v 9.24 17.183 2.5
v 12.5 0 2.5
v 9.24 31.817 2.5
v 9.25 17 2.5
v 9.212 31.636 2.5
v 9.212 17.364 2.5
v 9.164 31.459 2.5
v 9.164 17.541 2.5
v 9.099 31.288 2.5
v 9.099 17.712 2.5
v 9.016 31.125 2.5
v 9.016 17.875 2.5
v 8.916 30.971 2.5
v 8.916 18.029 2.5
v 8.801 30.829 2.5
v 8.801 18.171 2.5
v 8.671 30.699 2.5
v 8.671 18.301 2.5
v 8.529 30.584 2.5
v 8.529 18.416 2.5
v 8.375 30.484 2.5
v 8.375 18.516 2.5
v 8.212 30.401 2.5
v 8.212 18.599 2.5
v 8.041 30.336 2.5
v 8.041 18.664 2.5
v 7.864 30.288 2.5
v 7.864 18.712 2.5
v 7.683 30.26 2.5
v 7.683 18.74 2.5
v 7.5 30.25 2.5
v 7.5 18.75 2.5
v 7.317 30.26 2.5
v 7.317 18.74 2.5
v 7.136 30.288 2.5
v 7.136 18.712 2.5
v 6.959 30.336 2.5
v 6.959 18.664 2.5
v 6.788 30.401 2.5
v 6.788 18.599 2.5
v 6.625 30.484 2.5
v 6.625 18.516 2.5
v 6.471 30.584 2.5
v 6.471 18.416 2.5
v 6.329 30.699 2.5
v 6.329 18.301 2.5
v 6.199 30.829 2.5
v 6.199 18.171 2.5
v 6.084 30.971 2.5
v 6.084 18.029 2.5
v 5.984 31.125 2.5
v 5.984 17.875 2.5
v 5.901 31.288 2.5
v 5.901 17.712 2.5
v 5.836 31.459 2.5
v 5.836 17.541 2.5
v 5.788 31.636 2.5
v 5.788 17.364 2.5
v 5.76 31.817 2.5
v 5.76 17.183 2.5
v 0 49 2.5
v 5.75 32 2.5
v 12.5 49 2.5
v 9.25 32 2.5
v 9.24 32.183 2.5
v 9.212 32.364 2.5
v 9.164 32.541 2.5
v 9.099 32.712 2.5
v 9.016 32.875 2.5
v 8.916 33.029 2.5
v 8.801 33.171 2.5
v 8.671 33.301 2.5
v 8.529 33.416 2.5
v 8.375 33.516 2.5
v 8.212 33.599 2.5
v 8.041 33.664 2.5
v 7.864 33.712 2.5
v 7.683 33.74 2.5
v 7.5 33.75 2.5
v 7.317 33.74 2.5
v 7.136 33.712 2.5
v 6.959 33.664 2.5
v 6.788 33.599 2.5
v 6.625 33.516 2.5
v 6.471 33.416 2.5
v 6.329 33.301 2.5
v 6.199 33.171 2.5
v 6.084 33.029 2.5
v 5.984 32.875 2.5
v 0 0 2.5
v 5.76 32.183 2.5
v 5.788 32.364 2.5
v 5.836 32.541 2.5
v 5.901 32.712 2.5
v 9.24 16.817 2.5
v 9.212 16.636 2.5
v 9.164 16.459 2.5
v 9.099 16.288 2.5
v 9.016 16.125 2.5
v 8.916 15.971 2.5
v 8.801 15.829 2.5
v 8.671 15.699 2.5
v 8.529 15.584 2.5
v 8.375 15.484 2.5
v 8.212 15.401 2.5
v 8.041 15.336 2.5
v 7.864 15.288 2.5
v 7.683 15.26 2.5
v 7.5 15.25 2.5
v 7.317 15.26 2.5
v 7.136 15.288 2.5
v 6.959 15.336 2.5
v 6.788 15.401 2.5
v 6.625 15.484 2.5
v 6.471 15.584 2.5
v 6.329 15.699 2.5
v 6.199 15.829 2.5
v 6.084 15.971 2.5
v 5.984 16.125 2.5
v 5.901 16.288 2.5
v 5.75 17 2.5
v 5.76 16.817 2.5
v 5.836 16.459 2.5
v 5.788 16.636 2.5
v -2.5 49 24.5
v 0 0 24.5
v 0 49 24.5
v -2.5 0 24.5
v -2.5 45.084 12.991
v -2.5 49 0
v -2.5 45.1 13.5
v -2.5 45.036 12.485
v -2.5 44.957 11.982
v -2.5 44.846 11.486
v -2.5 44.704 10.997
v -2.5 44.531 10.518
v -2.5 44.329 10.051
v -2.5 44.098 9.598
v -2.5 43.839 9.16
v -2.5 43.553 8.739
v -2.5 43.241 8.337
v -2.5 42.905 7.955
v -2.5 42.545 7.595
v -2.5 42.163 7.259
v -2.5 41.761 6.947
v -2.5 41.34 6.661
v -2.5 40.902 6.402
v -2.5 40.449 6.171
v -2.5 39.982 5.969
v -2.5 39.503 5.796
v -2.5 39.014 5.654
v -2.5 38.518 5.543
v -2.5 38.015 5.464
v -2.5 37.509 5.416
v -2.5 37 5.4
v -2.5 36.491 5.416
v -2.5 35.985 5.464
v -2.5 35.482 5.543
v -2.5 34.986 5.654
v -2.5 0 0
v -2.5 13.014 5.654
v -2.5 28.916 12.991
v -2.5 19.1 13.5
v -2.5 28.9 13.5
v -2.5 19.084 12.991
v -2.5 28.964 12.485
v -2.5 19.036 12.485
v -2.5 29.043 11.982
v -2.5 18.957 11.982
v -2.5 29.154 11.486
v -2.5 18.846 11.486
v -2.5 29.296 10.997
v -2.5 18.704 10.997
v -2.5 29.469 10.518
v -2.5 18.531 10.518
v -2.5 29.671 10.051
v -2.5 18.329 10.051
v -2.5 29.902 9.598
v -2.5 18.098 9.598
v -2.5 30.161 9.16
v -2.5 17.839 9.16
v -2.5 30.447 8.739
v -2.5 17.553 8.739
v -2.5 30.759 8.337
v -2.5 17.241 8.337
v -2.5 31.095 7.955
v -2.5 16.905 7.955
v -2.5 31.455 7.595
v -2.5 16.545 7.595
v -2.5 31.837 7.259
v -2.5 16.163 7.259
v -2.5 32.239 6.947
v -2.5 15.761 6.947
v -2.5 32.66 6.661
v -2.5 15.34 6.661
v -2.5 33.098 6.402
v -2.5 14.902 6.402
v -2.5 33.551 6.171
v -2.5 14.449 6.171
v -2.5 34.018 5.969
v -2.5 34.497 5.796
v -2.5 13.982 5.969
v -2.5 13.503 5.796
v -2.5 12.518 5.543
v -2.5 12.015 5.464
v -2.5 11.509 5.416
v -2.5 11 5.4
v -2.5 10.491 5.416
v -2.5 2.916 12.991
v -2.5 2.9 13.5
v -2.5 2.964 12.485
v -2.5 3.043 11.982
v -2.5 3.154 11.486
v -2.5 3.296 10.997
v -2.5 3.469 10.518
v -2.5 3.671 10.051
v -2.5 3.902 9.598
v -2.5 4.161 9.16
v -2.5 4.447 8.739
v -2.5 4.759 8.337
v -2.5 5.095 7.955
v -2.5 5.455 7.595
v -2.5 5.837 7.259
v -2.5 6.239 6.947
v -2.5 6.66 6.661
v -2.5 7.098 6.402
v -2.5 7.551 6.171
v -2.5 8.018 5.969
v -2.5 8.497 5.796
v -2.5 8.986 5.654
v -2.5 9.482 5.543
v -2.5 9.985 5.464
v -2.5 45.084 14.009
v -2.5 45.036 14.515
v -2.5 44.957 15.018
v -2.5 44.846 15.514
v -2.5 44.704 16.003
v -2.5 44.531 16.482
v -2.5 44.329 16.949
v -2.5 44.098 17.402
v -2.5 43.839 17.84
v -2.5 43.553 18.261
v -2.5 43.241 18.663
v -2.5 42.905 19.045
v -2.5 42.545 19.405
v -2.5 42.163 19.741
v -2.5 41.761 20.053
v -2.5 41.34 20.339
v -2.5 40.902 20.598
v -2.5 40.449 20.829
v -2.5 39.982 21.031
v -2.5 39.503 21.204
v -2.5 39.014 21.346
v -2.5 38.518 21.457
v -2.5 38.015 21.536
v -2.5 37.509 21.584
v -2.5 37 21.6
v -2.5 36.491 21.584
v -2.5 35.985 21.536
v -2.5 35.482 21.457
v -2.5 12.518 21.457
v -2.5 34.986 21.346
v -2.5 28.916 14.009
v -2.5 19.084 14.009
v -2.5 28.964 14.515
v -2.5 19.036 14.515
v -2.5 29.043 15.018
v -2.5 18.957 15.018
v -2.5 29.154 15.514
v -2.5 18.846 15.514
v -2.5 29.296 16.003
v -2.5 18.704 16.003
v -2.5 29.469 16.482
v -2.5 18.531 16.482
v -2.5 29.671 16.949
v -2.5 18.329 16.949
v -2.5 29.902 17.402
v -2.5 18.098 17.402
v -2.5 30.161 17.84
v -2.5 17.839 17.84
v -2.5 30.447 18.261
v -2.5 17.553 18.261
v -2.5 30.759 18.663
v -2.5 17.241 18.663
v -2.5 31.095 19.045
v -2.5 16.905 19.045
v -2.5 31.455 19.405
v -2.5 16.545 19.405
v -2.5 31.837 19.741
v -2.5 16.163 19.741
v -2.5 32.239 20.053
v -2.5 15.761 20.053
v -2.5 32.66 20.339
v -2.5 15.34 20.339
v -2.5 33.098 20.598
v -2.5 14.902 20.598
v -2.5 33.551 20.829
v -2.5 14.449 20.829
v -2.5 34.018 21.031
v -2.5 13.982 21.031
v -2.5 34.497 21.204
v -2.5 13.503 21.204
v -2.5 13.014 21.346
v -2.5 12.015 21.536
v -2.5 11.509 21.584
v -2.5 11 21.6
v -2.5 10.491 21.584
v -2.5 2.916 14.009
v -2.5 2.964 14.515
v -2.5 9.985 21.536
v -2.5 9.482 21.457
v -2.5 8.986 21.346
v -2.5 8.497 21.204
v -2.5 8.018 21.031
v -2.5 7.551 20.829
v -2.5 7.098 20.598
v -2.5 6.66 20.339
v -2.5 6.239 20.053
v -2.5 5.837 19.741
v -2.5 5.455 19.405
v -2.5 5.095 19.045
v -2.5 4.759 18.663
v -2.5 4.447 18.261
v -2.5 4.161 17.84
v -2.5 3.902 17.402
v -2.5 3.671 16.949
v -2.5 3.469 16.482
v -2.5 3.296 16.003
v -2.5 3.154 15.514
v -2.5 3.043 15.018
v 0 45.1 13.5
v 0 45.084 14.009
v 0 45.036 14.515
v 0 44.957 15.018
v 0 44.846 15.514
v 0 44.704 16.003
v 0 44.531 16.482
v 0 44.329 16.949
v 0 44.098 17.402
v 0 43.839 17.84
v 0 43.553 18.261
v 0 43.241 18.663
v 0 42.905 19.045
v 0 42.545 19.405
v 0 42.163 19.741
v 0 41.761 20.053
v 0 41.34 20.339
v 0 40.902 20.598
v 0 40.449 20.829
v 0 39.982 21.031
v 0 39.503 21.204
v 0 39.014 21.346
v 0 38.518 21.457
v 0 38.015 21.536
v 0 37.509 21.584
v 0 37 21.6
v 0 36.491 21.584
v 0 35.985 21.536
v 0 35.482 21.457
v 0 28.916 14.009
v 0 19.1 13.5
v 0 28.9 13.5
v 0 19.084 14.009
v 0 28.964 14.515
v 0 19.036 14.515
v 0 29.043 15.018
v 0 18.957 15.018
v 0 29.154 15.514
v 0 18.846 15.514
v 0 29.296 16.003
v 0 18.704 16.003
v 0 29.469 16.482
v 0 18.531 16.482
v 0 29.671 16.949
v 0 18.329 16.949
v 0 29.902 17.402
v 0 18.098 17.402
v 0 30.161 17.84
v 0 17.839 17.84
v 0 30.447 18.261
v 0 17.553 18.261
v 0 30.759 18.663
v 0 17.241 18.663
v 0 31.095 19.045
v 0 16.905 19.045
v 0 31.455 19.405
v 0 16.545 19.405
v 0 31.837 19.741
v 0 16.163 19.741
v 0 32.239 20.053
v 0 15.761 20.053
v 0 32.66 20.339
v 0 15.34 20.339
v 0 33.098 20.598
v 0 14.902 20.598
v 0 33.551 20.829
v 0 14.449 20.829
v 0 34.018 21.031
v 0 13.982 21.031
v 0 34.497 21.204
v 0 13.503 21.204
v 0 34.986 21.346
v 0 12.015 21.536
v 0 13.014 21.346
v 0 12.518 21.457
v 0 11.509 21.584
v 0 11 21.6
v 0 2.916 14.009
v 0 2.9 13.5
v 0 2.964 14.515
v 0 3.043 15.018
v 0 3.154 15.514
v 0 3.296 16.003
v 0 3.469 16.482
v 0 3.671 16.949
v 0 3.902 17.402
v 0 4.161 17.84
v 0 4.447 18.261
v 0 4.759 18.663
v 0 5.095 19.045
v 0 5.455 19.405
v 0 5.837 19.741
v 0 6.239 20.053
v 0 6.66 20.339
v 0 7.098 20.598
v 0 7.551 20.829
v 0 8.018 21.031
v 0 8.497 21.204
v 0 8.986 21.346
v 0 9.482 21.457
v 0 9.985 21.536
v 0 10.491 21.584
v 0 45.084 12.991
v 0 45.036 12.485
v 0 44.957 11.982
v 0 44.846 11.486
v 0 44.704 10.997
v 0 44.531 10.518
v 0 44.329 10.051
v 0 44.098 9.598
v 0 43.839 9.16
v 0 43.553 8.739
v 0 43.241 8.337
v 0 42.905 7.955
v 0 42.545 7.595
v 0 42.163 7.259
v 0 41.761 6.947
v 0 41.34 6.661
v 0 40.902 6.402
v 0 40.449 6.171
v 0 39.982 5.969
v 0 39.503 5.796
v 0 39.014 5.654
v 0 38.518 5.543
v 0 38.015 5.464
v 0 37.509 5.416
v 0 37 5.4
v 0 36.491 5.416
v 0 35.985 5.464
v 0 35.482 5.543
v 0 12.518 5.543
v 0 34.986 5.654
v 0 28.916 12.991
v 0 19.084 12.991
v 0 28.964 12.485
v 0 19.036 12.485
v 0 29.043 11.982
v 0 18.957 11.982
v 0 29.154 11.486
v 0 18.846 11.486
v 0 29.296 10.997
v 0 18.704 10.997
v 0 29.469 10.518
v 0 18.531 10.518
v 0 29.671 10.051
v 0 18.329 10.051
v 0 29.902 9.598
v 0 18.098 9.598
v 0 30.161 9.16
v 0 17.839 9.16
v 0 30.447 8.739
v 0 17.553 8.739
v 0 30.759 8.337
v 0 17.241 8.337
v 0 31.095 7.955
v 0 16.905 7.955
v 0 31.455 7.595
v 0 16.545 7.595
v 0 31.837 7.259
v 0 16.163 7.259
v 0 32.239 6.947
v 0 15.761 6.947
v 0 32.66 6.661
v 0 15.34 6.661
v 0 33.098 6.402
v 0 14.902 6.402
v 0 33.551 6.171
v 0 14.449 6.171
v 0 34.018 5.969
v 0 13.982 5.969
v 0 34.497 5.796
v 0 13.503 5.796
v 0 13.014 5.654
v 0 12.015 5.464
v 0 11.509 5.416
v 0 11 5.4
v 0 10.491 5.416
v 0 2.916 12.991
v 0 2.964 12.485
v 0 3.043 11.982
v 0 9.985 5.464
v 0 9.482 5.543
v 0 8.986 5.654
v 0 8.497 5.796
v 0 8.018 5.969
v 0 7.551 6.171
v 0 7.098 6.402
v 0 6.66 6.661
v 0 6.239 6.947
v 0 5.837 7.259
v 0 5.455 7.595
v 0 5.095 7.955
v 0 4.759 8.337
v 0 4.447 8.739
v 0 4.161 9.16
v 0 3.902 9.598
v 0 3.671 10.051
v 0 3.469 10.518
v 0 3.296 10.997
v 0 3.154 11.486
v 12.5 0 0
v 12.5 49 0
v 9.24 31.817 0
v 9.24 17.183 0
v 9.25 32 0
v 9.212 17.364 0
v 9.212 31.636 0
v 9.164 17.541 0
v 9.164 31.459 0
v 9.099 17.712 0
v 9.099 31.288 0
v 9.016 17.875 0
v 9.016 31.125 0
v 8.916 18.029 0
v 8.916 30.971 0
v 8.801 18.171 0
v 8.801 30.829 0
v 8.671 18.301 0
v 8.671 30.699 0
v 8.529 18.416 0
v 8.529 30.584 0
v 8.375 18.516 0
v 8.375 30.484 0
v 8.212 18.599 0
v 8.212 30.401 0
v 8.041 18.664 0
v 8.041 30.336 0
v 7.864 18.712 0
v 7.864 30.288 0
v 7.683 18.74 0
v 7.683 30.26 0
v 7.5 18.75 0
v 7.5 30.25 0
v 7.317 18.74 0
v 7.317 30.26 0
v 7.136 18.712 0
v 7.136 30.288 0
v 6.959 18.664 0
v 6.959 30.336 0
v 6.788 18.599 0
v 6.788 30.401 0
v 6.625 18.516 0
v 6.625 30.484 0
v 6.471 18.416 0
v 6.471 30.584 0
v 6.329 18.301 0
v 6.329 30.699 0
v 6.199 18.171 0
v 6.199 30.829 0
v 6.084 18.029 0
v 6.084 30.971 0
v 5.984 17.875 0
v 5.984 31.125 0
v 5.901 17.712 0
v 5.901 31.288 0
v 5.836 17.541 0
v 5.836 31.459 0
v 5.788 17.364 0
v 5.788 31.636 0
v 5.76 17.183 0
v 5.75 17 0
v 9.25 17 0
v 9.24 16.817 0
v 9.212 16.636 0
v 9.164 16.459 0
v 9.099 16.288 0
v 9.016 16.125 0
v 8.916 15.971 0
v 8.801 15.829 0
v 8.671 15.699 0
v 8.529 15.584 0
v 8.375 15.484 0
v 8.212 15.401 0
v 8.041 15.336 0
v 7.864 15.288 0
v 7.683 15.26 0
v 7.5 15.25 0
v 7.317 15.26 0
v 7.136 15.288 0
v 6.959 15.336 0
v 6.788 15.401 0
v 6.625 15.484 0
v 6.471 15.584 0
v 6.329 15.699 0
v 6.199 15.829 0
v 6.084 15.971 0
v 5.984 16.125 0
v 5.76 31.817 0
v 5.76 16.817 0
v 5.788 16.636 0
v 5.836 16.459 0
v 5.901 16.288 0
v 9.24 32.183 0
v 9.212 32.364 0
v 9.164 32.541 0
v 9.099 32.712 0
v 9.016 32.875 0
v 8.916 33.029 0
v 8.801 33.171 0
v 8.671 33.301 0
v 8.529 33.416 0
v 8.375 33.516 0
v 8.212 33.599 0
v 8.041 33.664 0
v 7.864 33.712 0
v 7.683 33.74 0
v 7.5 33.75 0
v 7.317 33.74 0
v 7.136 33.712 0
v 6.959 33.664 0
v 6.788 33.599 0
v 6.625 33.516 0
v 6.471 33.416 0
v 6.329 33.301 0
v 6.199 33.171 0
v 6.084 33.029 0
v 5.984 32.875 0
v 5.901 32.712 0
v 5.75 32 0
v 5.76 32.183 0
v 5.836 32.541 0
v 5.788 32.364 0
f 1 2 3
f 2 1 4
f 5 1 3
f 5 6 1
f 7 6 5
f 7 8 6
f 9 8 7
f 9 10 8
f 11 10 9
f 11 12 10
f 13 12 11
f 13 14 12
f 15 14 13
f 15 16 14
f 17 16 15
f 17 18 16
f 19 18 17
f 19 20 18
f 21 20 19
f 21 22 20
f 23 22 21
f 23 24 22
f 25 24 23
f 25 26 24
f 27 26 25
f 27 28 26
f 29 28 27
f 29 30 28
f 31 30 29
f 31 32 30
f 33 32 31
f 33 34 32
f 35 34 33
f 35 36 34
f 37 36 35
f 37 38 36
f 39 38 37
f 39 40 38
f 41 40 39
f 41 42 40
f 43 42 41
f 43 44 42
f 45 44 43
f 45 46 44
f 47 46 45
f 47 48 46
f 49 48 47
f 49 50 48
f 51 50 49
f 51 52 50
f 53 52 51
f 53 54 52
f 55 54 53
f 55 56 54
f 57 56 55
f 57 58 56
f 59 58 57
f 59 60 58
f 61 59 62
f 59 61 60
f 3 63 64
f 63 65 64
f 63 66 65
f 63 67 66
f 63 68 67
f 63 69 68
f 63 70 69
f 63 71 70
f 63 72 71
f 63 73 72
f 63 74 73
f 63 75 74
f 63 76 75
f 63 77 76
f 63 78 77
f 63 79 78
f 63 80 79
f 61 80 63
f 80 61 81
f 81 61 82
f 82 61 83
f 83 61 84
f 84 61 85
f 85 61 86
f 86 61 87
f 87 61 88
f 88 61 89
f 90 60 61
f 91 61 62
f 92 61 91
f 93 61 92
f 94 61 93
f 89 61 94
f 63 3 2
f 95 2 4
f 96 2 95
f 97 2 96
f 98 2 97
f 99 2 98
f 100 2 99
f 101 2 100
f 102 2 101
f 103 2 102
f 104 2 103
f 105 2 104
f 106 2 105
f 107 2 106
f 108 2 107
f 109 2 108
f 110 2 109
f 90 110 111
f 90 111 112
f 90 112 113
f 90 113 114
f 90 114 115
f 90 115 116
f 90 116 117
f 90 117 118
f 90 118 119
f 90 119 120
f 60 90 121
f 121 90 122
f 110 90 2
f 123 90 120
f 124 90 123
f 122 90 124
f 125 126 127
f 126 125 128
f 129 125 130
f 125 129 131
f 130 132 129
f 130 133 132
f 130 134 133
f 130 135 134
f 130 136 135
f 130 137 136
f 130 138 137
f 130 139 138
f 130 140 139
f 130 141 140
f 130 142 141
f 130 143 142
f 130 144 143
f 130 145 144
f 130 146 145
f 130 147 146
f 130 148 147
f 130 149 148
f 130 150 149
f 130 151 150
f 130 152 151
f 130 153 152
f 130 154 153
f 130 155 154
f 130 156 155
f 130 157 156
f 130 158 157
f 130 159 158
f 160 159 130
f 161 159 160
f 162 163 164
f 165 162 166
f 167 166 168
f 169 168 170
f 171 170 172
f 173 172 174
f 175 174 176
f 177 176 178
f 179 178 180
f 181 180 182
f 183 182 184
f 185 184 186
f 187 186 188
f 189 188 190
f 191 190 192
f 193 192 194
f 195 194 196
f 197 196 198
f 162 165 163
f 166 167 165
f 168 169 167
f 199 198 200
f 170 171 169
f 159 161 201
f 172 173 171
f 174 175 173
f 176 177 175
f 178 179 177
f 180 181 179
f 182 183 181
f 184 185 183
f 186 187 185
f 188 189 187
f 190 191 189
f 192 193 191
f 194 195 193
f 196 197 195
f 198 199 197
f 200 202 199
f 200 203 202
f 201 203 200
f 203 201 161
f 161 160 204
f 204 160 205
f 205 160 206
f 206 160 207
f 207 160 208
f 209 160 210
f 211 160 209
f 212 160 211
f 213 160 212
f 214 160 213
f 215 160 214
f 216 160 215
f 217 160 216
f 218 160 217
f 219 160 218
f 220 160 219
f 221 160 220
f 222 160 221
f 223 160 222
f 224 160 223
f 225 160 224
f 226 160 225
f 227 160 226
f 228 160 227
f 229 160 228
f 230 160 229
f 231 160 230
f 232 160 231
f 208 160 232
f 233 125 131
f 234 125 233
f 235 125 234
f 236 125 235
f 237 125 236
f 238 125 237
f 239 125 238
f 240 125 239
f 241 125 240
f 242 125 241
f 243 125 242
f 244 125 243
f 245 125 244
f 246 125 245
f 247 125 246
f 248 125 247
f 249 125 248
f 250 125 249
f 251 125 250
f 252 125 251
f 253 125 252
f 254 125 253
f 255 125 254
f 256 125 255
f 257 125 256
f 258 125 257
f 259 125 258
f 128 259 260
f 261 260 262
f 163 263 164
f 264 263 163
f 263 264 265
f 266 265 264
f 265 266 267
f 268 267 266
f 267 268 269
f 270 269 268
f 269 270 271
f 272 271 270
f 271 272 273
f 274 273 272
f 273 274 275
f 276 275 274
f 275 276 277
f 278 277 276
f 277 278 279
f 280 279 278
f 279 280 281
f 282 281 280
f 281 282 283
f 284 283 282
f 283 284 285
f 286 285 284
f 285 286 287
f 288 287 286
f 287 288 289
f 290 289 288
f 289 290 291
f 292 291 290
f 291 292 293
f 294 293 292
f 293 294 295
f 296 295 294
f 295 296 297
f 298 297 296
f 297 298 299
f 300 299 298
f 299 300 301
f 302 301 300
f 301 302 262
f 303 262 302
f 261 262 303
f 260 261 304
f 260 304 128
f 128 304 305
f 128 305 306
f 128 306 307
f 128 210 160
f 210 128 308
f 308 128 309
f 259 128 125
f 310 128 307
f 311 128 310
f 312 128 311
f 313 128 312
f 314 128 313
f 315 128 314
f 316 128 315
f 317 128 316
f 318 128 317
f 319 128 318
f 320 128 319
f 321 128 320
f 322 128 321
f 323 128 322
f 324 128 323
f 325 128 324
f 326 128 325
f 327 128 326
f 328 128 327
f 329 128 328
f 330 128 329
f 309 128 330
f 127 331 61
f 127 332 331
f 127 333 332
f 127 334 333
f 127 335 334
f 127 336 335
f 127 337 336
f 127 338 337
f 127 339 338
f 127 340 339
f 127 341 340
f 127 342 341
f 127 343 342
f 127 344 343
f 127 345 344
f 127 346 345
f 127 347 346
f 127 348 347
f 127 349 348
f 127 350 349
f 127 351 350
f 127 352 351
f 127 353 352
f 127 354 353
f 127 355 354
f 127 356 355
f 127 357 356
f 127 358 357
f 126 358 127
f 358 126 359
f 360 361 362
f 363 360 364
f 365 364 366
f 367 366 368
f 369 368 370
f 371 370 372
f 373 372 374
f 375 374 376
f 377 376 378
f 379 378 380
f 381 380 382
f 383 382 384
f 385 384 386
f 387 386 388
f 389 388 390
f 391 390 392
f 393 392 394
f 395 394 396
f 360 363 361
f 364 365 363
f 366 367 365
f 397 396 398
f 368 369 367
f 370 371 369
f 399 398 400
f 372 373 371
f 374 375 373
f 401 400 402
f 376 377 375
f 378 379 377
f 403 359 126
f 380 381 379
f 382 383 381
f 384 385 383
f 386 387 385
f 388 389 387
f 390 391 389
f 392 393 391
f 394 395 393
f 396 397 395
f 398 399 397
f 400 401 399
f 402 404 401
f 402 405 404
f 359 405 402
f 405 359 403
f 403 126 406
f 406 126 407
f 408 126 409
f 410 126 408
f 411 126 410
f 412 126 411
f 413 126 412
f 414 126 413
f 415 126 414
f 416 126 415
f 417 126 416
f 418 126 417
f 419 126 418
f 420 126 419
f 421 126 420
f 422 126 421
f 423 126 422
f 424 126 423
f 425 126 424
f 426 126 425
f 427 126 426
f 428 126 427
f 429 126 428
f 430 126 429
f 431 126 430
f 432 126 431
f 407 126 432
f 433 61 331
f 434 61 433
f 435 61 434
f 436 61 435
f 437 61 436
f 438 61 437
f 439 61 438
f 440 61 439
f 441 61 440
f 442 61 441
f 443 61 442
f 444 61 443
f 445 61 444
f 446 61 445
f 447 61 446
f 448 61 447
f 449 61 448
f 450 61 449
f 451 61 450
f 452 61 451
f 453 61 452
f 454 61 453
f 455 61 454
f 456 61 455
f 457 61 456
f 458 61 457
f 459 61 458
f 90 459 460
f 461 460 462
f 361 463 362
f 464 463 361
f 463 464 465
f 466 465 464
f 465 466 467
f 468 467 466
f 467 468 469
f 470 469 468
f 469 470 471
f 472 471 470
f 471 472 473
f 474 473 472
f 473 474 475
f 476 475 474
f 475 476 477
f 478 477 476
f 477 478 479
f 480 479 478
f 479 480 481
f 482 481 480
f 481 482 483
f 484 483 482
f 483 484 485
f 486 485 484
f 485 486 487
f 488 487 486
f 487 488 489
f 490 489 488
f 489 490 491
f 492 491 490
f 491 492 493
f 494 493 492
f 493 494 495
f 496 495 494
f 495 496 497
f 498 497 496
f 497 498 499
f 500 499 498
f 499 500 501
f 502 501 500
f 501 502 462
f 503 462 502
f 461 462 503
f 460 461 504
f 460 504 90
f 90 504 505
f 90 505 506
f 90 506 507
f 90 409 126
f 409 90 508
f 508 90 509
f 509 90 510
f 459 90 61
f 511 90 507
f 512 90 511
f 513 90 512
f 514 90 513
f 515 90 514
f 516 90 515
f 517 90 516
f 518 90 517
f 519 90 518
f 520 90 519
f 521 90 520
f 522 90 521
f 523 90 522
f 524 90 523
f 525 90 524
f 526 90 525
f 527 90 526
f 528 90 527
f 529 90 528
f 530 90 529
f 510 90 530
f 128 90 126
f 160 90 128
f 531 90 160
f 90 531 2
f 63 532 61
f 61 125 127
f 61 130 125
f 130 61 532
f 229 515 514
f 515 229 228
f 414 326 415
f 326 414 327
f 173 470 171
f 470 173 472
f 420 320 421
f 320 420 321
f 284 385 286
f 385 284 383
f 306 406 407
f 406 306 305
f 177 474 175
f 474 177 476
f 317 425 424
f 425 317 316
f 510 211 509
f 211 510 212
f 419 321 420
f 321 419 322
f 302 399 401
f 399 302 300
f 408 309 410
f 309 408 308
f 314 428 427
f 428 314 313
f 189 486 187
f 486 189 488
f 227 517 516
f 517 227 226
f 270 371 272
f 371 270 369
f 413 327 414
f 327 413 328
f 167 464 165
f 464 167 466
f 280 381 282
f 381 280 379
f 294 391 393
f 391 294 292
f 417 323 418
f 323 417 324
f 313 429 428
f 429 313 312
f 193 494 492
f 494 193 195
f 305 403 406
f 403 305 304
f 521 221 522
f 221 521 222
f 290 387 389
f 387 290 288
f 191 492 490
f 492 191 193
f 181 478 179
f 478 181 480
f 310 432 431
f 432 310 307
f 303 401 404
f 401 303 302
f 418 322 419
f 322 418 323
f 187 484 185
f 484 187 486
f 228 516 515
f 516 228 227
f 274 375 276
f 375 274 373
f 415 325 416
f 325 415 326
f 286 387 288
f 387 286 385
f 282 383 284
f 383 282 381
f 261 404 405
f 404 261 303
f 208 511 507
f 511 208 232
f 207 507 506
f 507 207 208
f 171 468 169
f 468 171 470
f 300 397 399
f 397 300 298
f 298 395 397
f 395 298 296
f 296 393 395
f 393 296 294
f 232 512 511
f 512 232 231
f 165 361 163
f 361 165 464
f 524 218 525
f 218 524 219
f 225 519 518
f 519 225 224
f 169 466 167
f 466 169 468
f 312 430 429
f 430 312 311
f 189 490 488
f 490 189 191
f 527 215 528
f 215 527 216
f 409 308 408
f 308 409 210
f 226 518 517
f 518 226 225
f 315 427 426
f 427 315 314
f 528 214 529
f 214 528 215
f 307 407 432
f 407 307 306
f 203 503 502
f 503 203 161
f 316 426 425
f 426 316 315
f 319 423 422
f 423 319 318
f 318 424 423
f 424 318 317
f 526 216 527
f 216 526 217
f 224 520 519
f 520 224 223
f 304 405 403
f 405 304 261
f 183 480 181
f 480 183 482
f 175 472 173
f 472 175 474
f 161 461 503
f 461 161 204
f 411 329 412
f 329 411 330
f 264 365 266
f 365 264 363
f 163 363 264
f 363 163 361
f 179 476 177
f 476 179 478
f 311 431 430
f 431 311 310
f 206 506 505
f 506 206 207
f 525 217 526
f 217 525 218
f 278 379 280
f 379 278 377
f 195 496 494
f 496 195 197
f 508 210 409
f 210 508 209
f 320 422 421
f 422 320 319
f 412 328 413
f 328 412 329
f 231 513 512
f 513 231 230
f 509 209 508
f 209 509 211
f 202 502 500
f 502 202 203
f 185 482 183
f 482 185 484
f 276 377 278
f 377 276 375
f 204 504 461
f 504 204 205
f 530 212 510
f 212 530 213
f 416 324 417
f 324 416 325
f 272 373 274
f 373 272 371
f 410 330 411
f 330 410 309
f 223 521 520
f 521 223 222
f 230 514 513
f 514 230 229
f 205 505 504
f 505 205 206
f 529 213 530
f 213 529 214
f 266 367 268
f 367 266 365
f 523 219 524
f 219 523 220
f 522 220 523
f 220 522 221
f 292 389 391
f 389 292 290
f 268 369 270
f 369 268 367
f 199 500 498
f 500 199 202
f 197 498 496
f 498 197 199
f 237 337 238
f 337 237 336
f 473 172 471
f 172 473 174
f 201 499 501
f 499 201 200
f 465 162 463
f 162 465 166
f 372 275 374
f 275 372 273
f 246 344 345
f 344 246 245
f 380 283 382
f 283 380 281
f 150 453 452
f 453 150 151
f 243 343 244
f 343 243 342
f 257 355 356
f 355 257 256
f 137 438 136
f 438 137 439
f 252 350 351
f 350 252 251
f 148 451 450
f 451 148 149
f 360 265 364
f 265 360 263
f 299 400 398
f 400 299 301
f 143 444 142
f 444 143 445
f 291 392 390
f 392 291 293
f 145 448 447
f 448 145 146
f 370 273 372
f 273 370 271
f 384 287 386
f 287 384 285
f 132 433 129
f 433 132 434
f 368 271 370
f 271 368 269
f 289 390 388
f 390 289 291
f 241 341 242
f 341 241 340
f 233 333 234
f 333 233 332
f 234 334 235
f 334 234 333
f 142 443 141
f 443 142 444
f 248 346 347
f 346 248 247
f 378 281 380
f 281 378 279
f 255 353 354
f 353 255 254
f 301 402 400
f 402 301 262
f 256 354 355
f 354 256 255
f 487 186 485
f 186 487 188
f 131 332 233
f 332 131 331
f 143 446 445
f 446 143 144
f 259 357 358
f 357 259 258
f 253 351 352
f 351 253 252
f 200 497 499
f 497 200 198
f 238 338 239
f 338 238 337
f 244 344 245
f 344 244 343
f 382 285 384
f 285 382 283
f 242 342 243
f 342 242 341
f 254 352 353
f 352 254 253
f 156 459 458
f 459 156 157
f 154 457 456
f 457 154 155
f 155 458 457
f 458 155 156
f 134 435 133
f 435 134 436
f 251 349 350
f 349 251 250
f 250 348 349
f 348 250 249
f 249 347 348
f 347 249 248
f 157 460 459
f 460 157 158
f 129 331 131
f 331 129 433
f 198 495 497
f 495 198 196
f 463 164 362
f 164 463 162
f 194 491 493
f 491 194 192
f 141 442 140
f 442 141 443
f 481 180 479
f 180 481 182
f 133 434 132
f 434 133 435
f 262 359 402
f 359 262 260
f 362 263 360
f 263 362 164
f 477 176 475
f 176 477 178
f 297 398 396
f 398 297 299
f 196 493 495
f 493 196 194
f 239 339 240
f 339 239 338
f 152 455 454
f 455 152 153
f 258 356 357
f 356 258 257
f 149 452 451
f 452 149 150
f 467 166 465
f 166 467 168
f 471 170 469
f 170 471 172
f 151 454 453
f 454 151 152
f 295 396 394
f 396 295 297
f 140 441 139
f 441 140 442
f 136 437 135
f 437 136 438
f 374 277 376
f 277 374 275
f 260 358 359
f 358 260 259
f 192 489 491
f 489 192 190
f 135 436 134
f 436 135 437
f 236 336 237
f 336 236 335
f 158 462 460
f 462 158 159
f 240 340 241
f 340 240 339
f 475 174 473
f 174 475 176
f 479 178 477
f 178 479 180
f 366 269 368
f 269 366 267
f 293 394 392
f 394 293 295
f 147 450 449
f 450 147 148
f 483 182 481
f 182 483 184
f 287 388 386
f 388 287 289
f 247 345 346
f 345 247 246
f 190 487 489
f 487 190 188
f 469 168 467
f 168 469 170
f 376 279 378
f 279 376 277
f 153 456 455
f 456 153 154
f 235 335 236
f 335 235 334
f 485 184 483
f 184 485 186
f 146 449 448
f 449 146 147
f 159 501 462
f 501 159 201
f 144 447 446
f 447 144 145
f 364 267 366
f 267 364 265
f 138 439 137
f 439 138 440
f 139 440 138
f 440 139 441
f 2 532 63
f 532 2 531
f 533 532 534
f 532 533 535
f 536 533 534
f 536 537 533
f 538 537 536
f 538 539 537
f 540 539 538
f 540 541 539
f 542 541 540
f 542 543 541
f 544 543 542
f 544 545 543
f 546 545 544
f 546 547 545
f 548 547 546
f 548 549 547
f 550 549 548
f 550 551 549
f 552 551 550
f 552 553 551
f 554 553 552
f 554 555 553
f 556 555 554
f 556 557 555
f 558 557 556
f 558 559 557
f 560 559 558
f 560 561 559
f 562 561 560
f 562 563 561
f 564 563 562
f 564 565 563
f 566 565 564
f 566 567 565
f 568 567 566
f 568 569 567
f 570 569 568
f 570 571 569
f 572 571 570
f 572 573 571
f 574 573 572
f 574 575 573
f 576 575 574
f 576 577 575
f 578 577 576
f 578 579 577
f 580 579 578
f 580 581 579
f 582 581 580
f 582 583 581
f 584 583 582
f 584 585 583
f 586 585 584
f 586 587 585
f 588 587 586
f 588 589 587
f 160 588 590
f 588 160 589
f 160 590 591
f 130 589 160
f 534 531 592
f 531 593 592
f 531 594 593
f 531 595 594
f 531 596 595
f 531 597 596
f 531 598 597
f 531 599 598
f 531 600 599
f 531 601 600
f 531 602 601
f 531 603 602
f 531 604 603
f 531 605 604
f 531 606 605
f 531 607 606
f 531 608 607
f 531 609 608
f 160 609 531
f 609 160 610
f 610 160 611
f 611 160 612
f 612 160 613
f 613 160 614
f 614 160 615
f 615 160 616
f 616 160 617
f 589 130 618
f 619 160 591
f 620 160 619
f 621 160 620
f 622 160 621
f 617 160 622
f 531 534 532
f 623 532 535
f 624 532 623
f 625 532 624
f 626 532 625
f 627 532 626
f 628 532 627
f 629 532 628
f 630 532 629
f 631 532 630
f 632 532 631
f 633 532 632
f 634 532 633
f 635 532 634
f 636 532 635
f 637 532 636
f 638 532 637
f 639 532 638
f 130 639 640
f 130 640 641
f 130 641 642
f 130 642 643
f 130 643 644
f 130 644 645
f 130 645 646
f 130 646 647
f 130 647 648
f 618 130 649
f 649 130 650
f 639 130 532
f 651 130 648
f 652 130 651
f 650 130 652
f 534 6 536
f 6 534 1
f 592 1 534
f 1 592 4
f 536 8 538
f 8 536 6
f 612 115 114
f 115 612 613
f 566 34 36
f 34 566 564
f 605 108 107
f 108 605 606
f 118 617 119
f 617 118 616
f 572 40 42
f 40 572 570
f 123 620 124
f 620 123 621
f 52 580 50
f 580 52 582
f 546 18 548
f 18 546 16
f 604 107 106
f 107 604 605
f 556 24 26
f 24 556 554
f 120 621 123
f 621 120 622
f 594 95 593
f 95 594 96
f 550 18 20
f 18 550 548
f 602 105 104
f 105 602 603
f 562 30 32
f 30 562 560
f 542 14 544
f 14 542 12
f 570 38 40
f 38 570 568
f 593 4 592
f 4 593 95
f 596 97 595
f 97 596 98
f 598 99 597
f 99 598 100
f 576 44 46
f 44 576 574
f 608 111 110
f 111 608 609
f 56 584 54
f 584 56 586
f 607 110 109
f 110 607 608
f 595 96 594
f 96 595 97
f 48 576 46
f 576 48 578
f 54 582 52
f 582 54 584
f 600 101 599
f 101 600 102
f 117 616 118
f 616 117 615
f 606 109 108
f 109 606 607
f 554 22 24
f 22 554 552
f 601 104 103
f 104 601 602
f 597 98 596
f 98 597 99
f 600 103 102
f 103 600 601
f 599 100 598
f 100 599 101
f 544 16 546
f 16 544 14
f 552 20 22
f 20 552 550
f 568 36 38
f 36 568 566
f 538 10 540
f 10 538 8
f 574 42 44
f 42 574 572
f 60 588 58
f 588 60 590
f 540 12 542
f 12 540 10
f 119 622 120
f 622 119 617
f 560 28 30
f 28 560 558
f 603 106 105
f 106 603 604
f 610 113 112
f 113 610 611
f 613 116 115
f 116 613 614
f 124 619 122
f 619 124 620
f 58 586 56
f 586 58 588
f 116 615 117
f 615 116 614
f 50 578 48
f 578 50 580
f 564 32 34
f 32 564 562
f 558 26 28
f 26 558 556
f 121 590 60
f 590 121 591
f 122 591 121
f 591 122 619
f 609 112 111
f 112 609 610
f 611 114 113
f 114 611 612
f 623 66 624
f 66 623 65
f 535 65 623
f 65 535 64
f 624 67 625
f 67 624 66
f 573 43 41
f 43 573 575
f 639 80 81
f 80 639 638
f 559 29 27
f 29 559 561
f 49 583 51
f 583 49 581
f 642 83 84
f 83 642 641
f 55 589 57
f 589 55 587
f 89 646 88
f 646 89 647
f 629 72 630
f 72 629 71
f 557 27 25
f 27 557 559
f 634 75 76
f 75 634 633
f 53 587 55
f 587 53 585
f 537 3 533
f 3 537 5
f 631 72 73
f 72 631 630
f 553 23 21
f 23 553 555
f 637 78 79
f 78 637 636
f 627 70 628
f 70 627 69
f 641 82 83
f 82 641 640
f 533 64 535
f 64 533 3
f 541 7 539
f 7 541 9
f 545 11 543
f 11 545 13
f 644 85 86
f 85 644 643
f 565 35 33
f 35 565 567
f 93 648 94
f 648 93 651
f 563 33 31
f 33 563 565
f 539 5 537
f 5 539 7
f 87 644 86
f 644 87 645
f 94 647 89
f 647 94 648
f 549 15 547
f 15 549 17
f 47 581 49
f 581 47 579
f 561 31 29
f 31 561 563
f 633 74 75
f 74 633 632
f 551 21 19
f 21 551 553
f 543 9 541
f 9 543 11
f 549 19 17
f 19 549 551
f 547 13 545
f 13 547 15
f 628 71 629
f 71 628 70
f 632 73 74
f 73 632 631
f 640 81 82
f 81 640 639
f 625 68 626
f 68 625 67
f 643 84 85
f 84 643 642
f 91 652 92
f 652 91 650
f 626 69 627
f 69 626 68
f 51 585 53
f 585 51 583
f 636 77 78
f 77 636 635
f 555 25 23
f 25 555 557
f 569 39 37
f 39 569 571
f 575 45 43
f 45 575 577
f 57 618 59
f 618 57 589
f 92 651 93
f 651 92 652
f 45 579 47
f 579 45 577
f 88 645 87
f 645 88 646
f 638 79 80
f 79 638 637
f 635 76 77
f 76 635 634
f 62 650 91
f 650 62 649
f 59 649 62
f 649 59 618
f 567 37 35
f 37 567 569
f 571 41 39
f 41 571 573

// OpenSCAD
// file: wntrmute.scad
function M2() = 1;
function M25() = 1.25;
function M3() = 1.75;
function M4() = 2.1;
function PlateHeight() = 2.5;
    

module screw_hole(size, x, y, height=PlateHeight()+1) {
    union() {
       translate([x, y, -1])
       cylinder(h=height, r=size, $fn=60); 
    };
}

// x and y are the center point for the battery mount.
module battery_mount(x, y, size=M3(), rotation=0) {
    offset = 19.5 / 2;
    union() {
        screw_hole(size, x-offset, y);
        screw_hole(size, x+offset, y);
    }
}

module arduino_uno(x, y, size=M3(), rotation=0) {
    union() {
        screw_hole(size, x, y); 
        screw_hole(size, x+50.8, y-15.2);
        screw_hole(size, x+50.8, y-43.1);
        screw_hole(size, x, y-48.3);
    }
}

module robot_power_board(x, y, size=M3(), rotation=0) {
    union() {
        screw_hole(size, x, y);
        screw_hole(size, x+31.5, y);
        screw_hole(size, x, y+18.5);
        screw_hole(size, x+31.5, y+18.5);
    }
}

module raspberry_pi_zero(x, y, size=M3(), rotation=0) {
    union () {
        screw_hole(size, x, y);
        screw_hole(size, x+58, y);
        screw_hole(size, x, y+23);
        screw_hole(size, x+58, y+23);
    }
}

module raspberry_pi_3(x, y, size=M3(), rotation=0) {
    union () {
        screw_hole(size, x, y);
        screw_hole(size, x+58, y);
        screw_hole(size, x, y+49);
        screw_hole(size, x+58, y+49);
    }
}

module ultrasonic_mount(x, y, size=M3(), rotation=undef) {
    //rotate(rotation?rotation:[0,0,0])
    union() {
        screw_hole(size, x, y);
        screw_hole(size, x+13, y);
    }
}
// main file
use <wntrmute.scad>


ursBarrelHeight= 15;
ursBarrelRadius = 8;
ursBarrelOffset = 26;
ursDepth = 20;
ursWidth = 45;
ursEdge = 2;
ursCenter1Y = ursEdge + ursBarrelRadius + 1;
ursCenter2Y = ursCenter1Y + ursBarrelOffset;

nedges=100;
mspacing=15; // mount spacing
moffset=mspacing/2;
width = ursWidth+(2 * ursEdge);
echo("width=", width);
mdepth = 15;
mount_center = width / 2;

union() {
    translate([0, 0, PlateHeight()])
    difference() {
        rotate([0, -90, 0]) cube([22, width, PlateHeight()]);
        rotate([0, -90, 0]) translate([11, ursCenter1Y, -1])
            cylinder(h=ursBarrelHeight, r=ursBarrelRadius+0.1, $fn=nedges);
        rotate([0, -90, 0]) translate([11, ursCenter2Y, -1]) 
            cylinder(h=ursBarrelHeight, r=ursBarrelRadius+0.1, $fn=nedges);
    }
    
    difference() {
        
        translate([-PlateHeight(), 0, 0]) cube([mdepth, width, PlateHeight()]);
        translate([-PlateHeight(), 0, 0]) screw_hole(M3(), 10, mount_center - moffset, 10);
        translate([-PlateHeight(), 0, 0]) screw_hole(M3(), 10, mount_center + moffset, 10);
    }    
}
